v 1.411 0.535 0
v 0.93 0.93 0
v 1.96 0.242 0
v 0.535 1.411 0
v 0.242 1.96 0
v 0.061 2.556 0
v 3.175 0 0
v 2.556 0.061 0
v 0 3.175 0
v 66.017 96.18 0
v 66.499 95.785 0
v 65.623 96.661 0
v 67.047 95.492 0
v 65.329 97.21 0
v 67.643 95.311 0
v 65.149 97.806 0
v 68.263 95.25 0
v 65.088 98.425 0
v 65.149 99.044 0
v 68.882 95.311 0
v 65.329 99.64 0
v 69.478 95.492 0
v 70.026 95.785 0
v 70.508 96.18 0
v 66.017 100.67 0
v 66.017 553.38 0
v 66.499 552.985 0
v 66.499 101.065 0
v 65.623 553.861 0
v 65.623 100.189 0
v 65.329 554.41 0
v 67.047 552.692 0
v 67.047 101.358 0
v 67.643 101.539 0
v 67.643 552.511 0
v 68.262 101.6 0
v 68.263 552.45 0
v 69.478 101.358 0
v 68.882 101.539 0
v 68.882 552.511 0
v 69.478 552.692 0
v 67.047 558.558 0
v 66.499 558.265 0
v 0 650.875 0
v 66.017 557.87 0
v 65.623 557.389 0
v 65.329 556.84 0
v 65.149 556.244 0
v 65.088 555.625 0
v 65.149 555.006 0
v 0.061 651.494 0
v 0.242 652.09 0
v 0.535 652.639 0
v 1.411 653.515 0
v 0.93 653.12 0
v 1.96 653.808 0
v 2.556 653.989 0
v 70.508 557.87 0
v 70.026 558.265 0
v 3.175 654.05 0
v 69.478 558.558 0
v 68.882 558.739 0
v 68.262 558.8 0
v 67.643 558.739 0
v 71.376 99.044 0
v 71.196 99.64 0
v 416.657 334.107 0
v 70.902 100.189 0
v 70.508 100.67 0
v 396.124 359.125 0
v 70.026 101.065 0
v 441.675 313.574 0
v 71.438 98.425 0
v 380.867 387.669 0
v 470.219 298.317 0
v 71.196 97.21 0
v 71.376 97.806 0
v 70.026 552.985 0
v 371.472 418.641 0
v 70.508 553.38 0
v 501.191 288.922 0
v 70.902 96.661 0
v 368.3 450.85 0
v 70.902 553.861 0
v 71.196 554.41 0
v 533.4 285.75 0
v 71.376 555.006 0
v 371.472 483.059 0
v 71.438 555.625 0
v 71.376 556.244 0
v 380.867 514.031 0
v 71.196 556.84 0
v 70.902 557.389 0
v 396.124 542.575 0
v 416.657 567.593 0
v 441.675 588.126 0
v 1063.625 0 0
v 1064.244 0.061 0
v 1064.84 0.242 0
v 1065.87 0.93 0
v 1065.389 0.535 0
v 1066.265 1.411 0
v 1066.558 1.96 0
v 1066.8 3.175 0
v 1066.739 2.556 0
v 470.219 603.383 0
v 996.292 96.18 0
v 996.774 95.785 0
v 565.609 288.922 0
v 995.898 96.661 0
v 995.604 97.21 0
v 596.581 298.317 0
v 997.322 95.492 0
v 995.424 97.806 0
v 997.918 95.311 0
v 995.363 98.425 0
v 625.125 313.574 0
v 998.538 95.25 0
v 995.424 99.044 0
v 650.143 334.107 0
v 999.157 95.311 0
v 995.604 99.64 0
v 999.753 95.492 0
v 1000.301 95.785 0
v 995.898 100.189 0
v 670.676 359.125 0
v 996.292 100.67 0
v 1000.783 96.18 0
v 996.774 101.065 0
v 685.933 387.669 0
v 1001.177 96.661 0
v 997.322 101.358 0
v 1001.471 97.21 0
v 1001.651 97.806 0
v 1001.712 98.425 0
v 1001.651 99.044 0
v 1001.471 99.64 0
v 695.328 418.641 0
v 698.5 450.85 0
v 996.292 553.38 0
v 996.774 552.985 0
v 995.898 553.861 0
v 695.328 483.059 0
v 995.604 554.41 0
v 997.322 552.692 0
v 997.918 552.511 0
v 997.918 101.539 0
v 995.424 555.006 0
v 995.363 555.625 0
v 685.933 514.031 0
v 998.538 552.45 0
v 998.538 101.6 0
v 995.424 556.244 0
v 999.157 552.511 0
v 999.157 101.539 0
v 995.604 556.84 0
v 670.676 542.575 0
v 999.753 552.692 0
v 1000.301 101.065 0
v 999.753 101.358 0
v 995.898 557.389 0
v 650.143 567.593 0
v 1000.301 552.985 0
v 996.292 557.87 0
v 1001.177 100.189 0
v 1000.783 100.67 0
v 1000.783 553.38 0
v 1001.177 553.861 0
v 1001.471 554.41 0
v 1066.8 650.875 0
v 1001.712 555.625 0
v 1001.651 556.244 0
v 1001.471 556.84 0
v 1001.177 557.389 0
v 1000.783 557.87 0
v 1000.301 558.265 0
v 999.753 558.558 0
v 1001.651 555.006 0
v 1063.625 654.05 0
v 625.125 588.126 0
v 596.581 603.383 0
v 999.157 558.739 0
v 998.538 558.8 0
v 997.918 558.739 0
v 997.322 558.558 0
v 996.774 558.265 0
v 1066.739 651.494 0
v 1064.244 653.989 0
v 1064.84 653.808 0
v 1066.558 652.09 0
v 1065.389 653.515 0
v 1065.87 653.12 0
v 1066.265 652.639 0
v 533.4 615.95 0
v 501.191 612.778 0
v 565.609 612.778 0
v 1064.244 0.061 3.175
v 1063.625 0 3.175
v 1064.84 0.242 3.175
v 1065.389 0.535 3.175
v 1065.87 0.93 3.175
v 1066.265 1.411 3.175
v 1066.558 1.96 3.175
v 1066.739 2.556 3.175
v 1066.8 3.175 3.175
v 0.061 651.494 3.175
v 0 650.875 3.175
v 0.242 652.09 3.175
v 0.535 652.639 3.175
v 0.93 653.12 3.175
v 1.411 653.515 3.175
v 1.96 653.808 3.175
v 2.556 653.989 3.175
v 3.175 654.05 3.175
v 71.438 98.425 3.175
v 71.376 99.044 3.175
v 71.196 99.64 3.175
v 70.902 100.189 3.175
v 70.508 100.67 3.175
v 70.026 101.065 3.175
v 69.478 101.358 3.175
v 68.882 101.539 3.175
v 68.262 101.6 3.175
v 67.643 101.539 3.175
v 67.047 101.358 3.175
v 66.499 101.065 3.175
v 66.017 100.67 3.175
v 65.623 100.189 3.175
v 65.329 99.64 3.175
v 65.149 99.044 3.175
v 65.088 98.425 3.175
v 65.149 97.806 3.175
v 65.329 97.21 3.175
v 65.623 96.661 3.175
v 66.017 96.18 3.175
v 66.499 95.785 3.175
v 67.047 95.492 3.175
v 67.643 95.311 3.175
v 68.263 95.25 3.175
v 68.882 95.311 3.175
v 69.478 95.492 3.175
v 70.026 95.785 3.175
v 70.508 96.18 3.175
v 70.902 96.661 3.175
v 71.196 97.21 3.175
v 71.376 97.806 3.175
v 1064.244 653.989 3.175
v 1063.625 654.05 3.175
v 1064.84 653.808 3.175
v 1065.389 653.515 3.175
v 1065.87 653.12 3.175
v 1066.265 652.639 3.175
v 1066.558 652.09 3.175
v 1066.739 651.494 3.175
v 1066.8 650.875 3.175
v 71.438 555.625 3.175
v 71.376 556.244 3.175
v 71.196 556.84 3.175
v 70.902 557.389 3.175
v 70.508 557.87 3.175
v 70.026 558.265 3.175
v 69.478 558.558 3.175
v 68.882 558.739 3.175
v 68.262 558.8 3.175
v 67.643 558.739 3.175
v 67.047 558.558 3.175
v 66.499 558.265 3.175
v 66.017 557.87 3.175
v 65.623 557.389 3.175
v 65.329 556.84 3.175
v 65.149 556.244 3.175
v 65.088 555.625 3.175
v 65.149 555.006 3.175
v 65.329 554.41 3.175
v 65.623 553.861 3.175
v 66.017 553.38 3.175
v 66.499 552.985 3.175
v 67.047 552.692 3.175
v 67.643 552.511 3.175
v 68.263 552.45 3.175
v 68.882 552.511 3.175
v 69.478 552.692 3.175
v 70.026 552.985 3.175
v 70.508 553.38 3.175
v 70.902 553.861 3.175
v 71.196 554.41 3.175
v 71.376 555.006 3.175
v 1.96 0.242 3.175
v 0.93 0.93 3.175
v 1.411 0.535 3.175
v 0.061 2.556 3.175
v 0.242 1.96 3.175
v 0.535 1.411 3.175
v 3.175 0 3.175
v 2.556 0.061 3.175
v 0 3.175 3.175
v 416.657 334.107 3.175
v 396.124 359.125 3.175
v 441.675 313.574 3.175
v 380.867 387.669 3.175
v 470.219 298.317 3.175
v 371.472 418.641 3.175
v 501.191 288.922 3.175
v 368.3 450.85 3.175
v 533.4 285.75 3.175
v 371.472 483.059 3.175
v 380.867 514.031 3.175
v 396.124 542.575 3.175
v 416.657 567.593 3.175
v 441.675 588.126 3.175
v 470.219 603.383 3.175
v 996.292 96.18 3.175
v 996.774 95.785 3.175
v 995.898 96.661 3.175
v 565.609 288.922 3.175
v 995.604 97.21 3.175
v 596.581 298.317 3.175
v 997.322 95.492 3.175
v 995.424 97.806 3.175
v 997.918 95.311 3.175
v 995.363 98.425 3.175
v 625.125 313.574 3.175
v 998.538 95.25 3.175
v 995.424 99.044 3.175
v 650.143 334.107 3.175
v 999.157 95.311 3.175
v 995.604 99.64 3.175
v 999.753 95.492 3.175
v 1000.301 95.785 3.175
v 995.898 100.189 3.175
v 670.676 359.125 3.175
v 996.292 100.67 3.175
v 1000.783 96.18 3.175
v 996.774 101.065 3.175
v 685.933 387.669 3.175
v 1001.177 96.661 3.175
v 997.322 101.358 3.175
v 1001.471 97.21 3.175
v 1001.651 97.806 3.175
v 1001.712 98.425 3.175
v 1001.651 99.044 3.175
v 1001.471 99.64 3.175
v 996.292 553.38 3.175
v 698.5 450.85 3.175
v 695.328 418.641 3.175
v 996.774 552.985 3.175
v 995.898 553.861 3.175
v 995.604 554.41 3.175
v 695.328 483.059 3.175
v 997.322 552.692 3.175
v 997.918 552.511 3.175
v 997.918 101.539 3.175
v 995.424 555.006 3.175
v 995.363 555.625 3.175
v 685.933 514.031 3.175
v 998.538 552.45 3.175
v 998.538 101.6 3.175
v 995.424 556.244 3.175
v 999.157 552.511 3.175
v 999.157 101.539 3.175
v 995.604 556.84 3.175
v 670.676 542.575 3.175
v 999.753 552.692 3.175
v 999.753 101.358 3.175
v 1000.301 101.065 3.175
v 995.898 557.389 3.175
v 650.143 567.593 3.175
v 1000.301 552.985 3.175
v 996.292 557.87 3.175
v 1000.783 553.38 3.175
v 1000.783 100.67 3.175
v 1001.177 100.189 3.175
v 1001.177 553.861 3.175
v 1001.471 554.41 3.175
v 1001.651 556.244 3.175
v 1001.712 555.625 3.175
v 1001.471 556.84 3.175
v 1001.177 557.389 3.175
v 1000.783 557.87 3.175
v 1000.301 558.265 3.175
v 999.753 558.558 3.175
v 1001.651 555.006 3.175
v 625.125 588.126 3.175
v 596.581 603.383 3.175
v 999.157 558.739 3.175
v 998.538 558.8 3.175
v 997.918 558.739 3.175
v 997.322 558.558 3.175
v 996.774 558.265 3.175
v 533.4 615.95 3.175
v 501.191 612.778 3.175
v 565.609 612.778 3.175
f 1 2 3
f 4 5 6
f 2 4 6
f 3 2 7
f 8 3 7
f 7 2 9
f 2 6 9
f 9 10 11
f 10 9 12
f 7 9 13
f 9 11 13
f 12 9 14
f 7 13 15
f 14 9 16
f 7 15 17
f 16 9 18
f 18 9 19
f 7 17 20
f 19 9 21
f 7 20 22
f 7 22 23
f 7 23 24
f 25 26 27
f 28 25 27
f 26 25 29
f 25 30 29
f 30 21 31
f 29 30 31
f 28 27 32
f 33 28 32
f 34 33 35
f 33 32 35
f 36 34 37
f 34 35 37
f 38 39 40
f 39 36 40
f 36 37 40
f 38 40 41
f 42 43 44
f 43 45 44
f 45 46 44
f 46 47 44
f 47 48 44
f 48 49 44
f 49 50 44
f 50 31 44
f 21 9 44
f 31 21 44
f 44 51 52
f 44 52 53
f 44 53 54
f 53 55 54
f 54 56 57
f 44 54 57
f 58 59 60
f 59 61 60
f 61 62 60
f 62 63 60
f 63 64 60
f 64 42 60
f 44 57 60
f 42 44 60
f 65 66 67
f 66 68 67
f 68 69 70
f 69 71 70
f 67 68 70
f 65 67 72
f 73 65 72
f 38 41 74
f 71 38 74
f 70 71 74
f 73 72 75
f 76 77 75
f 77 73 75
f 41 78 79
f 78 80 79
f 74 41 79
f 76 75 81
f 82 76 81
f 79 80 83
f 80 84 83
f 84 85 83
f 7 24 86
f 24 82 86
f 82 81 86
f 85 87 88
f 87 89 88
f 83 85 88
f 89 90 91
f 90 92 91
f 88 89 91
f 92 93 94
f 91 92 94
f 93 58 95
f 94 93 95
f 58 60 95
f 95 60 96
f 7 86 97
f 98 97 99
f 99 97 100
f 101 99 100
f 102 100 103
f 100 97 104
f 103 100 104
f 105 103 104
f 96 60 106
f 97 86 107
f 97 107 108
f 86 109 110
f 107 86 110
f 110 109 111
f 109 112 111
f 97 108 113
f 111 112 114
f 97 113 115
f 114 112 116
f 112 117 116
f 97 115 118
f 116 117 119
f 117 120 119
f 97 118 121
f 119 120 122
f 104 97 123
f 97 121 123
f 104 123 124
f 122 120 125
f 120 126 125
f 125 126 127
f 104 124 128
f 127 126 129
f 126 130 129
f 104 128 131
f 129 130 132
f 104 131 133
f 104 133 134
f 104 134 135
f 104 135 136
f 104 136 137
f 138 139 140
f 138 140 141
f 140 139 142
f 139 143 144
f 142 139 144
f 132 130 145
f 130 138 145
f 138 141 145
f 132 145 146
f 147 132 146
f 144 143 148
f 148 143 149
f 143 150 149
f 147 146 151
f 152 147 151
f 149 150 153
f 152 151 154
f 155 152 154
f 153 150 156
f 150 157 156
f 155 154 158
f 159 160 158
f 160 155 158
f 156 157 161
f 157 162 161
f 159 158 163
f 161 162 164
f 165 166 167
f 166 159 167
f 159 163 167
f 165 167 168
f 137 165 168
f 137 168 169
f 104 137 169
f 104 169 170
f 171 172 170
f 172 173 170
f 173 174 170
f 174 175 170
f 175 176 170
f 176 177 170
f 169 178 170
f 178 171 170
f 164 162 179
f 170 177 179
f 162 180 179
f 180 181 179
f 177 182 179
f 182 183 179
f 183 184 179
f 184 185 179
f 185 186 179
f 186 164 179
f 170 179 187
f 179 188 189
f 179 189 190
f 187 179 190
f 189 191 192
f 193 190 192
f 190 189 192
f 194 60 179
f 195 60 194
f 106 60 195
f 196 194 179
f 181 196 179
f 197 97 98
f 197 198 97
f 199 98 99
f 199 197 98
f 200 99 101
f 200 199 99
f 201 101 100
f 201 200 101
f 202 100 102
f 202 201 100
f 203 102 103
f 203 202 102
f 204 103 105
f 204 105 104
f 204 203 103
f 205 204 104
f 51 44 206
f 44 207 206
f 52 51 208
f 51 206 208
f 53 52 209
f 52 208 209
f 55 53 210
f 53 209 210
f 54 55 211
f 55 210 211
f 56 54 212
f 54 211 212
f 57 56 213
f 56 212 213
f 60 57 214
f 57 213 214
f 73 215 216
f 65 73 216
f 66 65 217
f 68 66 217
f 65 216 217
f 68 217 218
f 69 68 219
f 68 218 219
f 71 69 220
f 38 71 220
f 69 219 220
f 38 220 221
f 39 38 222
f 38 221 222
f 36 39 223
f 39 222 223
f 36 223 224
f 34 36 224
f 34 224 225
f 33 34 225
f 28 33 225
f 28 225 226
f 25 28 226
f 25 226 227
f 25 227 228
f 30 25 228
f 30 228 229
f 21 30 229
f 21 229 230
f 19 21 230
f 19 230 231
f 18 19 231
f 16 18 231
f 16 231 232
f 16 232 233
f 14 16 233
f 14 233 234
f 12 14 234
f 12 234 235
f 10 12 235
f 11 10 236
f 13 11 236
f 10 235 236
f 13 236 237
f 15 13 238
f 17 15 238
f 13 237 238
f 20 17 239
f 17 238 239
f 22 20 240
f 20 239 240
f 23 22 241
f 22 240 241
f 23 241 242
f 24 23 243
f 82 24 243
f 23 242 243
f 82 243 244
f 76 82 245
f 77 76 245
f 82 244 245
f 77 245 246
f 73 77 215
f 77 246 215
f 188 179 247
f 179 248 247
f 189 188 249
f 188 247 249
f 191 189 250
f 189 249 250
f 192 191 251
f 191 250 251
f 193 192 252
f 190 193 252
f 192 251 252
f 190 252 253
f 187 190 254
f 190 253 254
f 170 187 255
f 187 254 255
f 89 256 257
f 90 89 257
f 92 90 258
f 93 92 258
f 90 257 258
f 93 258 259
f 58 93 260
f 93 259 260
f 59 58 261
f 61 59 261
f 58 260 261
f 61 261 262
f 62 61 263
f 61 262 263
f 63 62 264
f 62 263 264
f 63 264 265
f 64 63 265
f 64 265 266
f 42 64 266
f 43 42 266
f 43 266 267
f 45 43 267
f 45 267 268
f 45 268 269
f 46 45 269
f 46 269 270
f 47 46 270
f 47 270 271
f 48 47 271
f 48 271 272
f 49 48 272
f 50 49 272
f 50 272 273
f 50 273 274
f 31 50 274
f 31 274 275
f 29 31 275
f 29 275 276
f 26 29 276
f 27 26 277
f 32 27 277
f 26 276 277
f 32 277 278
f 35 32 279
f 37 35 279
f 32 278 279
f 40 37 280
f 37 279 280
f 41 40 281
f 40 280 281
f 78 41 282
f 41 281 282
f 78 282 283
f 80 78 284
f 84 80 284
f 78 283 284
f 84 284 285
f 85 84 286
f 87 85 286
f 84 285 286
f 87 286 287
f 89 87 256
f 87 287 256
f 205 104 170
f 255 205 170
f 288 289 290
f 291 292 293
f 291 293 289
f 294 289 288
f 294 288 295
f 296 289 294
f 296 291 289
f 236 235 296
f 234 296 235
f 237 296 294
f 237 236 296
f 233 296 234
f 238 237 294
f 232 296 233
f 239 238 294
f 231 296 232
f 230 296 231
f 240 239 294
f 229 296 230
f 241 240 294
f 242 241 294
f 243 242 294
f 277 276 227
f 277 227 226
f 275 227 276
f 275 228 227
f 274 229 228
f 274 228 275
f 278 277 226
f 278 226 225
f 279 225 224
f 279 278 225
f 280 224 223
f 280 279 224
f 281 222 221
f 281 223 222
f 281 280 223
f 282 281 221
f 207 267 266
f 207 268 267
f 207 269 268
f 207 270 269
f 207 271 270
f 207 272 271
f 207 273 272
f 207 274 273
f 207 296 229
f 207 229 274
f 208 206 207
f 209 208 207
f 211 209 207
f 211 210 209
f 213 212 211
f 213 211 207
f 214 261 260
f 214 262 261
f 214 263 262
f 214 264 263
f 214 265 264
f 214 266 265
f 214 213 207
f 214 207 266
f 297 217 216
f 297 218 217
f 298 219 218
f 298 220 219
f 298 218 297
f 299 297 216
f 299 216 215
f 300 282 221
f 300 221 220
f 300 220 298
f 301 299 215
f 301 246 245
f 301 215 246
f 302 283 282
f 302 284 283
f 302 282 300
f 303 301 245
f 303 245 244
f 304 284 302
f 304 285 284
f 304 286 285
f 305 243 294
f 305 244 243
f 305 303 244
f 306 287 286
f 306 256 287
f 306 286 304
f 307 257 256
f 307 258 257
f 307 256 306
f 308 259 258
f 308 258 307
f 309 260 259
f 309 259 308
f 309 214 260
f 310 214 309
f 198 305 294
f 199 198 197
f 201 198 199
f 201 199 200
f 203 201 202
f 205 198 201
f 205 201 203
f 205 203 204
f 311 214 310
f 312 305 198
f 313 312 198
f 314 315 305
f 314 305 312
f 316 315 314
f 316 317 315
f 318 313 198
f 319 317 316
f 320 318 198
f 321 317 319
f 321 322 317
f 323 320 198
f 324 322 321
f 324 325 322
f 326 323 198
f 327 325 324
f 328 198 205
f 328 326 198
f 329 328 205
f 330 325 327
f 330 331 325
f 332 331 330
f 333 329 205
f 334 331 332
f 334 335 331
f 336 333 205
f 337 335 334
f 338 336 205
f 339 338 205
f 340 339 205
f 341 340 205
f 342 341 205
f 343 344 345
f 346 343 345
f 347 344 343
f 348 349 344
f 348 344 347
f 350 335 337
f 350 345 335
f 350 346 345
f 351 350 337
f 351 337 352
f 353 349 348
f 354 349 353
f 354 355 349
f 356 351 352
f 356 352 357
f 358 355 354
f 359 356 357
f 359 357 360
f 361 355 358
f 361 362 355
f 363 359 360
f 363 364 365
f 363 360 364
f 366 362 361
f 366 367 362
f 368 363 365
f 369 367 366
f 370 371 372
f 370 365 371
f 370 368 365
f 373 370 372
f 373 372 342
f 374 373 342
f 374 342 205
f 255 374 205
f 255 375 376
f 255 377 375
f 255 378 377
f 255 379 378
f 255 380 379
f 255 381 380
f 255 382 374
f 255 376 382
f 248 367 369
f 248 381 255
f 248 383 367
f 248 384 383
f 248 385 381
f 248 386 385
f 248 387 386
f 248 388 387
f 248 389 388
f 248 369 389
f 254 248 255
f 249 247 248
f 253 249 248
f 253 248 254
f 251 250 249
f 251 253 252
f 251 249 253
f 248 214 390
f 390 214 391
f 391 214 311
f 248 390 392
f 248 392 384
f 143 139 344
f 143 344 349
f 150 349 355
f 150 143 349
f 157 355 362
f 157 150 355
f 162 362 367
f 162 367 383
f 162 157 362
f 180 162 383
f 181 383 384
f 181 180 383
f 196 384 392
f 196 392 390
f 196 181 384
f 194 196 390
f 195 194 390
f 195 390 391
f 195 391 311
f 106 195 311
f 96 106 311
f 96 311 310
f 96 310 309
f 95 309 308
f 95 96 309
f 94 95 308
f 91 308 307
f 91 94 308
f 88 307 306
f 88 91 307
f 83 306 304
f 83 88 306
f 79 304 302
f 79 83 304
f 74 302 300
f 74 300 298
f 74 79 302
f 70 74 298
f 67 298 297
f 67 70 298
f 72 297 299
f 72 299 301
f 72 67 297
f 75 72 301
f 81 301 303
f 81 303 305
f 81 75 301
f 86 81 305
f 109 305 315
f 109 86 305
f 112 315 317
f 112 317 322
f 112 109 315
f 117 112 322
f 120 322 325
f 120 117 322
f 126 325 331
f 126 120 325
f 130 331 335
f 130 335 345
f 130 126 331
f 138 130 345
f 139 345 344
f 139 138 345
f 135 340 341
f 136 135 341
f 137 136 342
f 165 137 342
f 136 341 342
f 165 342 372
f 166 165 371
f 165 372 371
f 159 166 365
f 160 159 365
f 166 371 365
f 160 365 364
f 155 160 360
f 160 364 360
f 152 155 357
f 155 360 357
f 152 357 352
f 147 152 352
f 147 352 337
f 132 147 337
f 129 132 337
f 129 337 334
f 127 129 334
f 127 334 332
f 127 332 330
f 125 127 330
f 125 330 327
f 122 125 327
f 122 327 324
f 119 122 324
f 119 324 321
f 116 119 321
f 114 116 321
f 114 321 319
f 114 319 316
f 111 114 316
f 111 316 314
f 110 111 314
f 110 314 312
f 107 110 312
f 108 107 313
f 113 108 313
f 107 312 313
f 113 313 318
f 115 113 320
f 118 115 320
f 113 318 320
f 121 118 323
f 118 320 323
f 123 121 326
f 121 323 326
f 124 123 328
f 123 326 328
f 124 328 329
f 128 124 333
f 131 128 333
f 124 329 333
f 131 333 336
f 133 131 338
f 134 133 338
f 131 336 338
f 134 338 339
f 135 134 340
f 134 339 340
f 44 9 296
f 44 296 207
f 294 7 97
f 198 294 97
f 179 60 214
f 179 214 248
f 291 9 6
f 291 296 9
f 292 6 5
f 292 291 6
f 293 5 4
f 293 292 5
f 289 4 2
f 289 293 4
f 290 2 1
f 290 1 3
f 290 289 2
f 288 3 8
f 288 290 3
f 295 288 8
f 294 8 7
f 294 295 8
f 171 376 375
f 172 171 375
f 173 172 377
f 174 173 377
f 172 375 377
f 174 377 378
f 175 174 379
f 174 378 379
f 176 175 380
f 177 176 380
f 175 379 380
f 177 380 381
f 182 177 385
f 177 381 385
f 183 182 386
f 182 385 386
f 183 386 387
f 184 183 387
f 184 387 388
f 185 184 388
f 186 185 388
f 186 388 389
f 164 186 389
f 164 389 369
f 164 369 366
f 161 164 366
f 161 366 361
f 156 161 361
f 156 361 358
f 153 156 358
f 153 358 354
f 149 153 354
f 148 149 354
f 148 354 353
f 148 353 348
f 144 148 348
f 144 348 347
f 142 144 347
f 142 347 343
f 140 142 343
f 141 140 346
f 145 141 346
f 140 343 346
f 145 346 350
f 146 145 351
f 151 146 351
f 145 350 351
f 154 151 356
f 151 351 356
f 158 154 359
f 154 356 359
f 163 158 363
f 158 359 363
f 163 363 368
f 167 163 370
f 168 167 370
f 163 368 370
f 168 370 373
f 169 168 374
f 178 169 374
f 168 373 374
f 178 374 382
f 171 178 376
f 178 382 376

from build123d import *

# Parameters (mm, degrees)
SKETCH1_W                   = 1066.8
SKETCH1_H                   = 654.05
SKETCH1_R                   = 165.1
BOSS_EXTRUDE1_DEPTH         = 3.175
F_1_4_0_25_DIAMETER_HOLE2_D = 6.35
FILLET1_R                   = 3.175


with BuildPart() as part:
    # Sketch1 → Boss-Extrude1 (new body)
    with BuildSketch(Plane.XY):
        with Locations((533.4, 327.025)):
            Rectangle(SKETCH1_W, SKETCH1_H)
        with Locations((533.4, 450.85)):
            Circle(SKETCH1_R, mode=Mode.SUBTRACT)
    extrude(amount=BOSS_EXTRUDE1_DEPTH)

    # 1/4 (0.25) Diameter Hole2 (through all)
    with Locations(Plane(origin=(0, 0, 0), x_dir=(-1, 0, 0), z_dir=(0, 0, -1))):
        with Locations((-998.5375, 555.625), (-998.5375, 98.425), (-68.2625, 98.425), (-68.2625, 555.625)):
            Hole(F_1_4_0_25_DIAMETER_HOLE2_D / 2)

    # Fillet1
    fillet1_edges = [part.edges().sort_by_distance(p)[0] for p in [
        (0, 654.05, 1.5875),
        (1066.8, 654.05, 1.5875),
        (1066.8, 0, 1.5875),
        (0, 0, 1.5875),
    ]]
    fillet(fillet1_edges, radius=FILLET1_R)


solid = part.part
